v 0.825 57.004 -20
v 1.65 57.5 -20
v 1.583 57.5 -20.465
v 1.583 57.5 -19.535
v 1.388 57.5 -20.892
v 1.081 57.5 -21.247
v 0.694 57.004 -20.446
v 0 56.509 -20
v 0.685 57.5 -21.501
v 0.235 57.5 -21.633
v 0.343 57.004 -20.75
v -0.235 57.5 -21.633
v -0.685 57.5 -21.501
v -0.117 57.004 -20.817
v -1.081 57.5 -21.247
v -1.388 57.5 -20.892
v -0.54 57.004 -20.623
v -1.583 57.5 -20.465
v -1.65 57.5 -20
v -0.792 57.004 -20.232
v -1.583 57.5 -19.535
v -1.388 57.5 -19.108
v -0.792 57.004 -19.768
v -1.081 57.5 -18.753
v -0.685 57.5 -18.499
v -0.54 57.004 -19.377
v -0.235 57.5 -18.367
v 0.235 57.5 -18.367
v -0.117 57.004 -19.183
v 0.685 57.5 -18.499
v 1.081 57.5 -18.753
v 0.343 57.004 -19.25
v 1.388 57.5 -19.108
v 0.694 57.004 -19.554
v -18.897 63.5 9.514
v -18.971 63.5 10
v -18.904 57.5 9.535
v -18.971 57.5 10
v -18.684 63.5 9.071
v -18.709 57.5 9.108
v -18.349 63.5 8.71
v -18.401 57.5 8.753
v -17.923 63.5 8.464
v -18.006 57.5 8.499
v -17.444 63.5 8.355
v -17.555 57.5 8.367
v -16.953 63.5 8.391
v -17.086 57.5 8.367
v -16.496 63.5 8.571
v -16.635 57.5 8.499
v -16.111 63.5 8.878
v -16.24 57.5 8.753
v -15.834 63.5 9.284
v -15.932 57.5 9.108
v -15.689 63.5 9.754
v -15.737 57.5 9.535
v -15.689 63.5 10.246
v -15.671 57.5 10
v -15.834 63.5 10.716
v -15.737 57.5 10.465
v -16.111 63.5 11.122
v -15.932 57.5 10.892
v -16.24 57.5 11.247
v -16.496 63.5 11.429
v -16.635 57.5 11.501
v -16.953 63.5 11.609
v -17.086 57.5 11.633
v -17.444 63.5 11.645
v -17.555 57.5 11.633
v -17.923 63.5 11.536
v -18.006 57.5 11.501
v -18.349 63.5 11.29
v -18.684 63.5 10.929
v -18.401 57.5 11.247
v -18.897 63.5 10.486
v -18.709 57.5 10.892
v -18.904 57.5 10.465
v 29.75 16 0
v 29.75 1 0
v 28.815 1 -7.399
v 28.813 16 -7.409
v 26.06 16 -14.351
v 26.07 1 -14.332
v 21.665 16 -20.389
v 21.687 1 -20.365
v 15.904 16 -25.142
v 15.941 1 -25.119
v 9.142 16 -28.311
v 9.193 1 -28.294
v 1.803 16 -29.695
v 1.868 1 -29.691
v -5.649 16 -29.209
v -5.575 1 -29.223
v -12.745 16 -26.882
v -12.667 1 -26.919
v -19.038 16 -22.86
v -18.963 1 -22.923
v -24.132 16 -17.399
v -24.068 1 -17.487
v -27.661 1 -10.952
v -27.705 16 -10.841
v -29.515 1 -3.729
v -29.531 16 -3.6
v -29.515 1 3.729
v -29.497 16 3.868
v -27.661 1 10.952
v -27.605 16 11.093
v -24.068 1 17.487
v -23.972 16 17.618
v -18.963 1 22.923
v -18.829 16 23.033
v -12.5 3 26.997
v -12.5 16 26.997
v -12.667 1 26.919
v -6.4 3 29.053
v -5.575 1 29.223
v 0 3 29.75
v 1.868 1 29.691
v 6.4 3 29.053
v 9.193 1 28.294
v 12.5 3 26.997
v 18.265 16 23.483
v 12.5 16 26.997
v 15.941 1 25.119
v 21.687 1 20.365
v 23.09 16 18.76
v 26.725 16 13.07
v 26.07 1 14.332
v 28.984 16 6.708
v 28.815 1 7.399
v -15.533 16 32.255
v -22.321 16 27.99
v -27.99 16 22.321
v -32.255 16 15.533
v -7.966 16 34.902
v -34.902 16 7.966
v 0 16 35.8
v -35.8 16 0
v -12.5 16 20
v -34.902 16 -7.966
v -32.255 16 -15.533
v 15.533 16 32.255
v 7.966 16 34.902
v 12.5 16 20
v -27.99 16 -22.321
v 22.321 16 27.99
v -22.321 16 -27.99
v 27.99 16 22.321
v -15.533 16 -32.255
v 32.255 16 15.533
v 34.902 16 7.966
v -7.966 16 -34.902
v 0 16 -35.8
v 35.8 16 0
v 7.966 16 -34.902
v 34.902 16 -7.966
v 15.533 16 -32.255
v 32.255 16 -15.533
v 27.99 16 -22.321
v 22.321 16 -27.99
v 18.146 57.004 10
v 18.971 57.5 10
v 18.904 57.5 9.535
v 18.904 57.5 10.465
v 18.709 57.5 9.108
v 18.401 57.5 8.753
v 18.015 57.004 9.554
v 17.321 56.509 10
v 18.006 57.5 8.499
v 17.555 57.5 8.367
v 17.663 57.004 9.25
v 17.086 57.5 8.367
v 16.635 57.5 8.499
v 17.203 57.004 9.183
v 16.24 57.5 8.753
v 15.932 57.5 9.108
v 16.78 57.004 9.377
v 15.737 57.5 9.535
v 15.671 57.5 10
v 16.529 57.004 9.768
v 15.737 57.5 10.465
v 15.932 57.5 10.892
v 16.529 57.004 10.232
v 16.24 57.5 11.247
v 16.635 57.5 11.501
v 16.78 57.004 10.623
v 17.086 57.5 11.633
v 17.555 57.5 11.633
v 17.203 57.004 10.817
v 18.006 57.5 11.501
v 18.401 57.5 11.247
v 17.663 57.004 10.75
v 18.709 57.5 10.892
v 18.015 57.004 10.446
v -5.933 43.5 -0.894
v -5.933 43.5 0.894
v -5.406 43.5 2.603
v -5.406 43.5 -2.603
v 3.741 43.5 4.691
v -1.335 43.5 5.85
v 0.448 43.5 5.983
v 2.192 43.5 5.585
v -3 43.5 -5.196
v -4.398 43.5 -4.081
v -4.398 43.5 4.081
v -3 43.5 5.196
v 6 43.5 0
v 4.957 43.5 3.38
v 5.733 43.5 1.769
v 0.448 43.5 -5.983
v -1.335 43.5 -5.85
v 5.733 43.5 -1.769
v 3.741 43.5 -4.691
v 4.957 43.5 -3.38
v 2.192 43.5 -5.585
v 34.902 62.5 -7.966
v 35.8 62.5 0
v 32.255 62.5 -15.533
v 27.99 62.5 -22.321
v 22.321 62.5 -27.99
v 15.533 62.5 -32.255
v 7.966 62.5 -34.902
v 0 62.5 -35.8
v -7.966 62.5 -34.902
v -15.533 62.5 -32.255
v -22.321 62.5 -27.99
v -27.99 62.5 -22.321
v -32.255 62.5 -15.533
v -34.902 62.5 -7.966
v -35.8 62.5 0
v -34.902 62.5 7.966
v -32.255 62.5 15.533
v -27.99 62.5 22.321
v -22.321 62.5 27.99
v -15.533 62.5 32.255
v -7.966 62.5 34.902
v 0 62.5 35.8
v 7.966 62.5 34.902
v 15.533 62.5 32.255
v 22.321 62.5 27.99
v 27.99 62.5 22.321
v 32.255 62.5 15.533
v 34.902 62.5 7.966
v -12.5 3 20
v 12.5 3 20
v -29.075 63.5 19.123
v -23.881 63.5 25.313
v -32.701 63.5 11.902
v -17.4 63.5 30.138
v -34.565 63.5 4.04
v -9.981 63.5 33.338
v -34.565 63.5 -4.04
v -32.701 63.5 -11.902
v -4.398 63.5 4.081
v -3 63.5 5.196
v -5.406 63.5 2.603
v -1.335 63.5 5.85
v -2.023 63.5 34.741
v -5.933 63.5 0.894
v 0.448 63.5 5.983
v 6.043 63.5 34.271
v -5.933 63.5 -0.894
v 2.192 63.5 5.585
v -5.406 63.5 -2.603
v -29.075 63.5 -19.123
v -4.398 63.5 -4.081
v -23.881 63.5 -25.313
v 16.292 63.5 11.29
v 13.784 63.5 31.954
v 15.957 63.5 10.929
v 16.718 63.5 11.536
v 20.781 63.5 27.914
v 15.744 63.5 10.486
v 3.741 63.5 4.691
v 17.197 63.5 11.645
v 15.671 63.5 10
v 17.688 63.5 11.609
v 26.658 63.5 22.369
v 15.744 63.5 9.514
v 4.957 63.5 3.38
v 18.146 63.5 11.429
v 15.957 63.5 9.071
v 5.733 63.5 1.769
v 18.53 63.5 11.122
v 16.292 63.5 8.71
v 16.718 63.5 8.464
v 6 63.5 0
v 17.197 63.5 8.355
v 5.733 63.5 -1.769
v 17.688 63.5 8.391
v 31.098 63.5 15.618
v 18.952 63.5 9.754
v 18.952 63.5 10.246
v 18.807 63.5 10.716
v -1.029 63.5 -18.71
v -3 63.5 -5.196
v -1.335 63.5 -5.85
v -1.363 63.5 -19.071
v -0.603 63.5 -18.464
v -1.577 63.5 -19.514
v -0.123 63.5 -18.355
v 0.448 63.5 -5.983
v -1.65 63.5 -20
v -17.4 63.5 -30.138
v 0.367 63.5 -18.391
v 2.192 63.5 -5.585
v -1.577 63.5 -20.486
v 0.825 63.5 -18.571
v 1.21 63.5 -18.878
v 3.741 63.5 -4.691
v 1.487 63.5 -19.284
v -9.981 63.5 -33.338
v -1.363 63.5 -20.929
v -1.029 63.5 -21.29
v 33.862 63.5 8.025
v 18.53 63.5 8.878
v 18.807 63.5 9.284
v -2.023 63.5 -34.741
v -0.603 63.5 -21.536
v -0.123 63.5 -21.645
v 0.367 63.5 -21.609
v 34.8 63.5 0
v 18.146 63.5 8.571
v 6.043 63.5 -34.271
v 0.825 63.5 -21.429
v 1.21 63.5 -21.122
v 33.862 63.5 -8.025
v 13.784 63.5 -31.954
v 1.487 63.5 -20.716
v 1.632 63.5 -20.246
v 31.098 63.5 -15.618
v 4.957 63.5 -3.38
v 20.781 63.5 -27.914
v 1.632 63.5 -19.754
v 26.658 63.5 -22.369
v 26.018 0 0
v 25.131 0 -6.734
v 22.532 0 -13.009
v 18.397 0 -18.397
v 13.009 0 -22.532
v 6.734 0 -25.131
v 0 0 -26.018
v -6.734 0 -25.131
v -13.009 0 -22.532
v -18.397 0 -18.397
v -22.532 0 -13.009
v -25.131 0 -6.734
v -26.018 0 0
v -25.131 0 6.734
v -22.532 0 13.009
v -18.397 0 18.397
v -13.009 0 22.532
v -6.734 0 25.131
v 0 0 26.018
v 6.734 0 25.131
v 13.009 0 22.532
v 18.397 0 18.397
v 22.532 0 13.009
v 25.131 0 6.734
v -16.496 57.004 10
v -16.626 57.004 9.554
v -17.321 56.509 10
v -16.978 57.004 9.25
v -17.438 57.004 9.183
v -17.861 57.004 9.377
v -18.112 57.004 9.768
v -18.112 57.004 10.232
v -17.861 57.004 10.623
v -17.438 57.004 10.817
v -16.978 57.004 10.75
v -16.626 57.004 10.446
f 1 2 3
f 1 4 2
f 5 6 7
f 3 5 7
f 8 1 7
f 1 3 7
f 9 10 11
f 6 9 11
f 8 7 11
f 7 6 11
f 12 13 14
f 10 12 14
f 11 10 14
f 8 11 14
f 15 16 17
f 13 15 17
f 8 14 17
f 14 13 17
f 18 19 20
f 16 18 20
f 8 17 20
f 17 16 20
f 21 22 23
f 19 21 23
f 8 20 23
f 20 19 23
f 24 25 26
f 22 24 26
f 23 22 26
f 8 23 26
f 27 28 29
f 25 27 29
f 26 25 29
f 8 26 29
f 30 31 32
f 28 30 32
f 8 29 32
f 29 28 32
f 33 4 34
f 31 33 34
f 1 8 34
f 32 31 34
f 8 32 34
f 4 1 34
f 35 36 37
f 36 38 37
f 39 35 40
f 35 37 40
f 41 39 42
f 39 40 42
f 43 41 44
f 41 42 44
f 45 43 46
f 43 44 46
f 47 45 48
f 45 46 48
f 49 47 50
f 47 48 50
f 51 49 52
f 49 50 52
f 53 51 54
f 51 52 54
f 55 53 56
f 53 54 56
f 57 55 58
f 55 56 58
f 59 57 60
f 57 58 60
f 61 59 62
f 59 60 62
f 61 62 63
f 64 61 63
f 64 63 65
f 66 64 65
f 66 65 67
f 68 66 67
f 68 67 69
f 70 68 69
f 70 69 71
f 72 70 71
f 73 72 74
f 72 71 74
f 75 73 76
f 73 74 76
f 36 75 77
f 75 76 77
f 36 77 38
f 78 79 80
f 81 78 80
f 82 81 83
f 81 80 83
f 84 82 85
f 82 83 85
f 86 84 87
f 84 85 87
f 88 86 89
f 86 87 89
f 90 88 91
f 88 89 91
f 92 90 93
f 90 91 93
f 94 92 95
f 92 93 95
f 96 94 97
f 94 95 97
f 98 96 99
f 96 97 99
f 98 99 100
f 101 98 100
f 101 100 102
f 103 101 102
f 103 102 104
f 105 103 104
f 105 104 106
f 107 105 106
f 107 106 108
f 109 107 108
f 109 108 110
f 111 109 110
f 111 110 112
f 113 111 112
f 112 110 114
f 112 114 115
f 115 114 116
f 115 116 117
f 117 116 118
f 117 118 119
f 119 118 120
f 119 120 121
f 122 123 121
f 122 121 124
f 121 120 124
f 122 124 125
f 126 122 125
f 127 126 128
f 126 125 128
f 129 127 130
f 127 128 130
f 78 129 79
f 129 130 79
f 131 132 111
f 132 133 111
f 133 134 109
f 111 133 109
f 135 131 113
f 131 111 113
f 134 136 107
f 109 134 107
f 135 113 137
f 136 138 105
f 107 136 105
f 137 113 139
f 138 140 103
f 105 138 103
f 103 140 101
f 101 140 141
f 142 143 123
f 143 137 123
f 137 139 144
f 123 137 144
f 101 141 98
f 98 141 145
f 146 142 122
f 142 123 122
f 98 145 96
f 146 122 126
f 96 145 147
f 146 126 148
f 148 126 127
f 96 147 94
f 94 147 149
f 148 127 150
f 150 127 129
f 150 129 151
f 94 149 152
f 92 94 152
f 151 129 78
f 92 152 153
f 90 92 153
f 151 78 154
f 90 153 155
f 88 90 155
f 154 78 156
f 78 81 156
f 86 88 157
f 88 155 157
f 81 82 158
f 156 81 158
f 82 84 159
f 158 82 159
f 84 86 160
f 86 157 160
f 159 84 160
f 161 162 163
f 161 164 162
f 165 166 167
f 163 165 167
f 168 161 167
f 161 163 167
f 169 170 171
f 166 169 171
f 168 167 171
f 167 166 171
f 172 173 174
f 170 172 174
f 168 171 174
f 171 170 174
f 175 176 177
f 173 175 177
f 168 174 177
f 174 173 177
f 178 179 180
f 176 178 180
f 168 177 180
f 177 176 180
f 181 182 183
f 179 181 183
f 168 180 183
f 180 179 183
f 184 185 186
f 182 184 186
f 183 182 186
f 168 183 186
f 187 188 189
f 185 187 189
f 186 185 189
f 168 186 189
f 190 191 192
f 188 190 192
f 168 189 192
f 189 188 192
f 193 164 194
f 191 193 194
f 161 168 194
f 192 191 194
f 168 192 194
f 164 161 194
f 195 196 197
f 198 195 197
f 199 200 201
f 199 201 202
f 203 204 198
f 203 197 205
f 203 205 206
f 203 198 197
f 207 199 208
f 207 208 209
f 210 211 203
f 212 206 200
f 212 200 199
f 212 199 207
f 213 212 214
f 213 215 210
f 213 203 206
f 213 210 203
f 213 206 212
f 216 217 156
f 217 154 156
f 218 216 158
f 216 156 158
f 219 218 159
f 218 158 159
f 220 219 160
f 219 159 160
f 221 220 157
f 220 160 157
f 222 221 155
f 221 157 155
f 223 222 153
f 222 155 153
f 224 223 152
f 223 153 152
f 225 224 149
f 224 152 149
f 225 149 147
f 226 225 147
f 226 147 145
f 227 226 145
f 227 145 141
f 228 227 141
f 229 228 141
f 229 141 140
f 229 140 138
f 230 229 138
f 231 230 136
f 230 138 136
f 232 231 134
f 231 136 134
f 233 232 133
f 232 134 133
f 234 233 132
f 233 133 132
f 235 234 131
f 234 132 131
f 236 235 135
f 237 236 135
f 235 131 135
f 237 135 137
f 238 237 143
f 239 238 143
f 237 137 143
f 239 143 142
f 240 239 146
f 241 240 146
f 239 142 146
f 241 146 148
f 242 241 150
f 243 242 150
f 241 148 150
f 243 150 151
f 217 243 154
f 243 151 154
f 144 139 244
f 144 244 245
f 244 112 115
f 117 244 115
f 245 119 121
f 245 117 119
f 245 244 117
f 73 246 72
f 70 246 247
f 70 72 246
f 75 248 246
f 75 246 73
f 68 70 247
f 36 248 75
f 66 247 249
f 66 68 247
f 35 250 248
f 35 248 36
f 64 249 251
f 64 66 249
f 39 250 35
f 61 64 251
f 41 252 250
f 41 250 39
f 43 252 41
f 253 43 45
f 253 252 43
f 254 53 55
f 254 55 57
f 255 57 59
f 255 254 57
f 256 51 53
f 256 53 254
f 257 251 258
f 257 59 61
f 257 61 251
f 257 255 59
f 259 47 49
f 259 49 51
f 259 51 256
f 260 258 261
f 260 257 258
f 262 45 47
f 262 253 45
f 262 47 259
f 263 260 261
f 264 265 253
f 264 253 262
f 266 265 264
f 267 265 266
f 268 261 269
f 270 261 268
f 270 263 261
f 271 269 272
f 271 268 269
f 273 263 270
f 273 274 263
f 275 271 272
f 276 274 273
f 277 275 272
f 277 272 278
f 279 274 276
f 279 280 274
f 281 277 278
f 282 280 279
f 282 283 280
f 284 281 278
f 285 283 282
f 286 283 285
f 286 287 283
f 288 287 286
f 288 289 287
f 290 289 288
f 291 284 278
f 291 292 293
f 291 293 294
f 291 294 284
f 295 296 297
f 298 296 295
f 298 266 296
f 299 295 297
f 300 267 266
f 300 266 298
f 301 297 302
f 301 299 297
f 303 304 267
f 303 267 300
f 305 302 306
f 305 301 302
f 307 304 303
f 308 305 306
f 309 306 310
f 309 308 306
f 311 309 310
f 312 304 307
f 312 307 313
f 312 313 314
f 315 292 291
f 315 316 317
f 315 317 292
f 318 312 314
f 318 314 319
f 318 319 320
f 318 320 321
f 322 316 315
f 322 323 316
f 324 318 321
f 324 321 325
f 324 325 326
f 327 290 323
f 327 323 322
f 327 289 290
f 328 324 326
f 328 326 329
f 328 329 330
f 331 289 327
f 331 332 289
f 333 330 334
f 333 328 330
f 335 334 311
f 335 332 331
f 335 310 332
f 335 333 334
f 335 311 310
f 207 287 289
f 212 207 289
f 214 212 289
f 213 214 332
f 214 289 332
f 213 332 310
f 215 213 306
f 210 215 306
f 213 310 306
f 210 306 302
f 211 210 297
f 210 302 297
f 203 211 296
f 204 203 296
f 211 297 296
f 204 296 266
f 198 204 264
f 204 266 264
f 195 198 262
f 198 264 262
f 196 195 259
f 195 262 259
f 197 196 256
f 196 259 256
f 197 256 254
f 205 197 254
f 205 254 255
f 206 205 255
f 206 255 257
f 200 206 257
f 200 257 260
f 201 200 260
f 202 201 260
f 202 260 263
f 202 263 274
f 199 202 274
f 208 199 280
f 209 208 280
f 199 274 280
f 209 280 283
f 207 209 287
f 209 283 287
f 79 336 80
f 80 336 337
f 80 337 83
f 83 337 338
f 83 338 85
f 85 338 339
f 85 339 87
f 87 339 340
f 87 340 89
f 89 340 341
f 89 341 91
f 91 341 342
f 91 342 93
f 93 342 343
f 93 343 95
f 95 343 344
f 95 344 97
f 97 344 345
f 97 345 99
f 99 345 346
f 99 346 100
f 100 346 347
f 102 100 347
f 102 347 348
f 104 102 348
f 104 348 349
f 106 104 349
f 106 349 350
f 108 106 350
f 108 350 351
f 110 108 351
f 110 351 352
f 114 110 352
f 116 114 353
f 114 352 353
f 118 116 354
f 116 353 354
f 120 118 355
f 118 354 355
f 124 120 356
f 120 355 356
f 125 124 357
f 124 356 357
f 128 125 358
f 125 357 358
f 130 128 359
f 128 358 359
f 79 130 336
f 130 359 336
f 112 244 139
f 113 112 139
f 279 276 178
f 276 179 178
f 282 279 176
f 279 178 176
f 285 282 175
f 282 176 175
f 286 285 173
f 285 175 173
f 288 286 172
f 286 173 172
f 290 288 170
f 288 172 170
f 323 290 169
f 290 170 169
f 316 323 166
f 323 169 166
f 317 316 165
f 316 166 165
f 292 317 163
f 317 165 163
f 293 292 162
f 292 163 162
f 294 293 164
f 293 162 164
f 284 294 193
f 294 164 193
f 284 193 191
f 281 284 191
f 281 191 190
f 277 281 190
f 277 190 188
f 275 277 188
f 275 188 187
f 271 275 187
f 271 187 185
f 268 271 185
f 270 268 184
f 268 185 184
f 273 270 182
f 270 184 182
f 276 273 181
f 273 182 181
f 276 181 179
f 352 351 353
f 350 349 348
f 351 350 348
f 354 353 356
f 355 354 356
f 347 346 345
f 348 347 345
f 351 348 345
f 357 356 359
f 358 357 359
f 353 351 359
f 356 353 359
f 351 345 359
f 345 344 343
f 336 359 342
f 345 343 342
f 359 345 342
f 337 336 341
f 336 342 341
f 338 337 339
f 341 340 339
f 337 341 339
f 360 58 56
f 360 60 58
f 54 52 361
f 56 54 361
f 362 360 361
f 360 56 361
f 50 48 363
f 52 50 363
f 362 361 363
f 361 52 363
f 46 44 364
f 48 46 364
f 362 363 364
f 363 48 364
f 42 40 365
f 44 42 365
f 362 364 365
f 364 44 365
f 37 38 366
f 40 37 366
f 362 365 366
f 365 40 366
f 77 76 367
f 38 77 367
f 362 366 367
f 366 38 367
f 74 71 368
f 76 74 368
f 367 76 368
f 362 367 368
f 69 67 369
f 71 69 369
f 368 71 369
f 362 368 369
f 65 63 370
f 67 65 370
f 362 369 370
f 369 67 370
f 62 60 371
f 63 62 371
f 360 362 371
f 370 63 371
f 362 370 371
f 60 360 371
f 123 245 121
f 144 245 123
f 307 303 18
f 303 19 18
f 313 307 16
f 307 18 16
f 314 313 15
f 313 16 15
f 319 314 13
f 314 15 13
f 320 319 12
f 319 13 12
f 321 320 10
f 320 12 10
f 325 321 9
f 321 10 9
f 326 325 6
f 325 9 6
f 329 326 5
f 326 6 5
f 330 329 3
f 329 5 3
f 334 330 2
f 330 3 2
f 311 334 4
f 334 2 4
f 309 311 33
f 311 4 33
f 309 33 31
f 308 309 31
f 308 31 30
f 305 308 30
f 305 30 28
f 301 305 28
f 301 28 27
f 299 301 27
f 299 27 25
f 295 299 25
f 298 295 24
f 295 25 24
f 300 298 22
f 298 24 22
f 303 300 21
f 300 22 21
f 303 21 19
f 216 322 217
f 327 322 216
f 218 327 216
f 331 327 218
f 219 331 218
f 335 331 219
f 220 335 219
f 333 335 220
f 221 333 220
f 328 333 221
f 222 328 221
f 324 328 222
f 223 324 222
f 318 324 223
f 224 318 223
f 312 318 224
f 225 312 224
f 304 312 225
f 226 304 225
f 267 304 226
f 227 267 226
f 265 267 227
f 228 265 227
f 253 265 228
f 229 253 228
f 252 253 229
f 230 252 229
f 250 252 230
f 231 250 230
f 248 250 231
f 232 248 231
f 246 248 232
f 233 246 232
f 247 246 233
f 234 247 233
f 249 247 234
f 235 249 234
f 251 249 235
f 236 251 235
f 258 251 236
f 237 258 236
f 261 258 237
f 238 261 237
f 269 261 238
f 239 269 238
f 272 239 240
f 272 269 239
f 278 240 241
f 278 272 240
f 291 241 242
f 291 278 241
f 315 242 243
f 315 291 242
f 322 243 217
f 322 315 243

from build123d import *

# Parameters (mm, degrees)
SKETCH1_R             = 29.75
BOSS_EXTRUDE1_DEPTH   = 16
SKETCH2_R             = 35.8
BOSS_EXTRUDE2_DEPTH   = 47.5
M4_TAPPED_HOLE1_D     = 3.3
M4_TAPPED_HOLE1_DEPTH = 6
M4_TAPPED_HOLE1_TIP   = 0.991420021
SKETCH6_R             = 6
CUT_EXTRUDE1_DEPTH    = 20
CHAMFER1_SIZE         = 1
CHAMFER2_SIZE         = 1
CHAMFER2_SIZE2        = 3.732050808
CUT_EXTRUDE2_START    = 20
SKETCH7_W             = 25
SKETCH7_H             = 13
CUT_EXTRUDE2_DEPTH    = 20


with BuildPart() as part:
    # Sketch1 → Boss-Extrude1 (new body)
    with BuildSketch(Plane(origin=(0, 0, 0), x_dir=(1, 0, 0), z_dir=(0, 1, 0))):
        Circle(SKETCH1_R)
    extrude(amount=BOSS_EXTRUDE1_DEPTH)

    # Sketch2 → Boss-Extrude2 (add)
    with BuildSketch(Plane(origin=(0, 16, 0), x_dir=(1, 0, 0), z_dir=(0, 1, 0))):
        Circle(SKETCH2_R)
    extrude(amount=BOSS_EXTRUDE2_DEPTH)

    # M4 Tapped Hole1
    with Locations(Plane(origin=(0, 63.5, 0), x_dir=(1, 0, 0), z_dir=(0, 1, 0))):
        with Locations((0, 20), (17.320508076, -10), (-17.320508076, -10)):
            Hole(M4_TAPPED_HOLE1_D / 2, depth=M4_TAPPED_HOLE1_DEPTH)
            with Locations((0, 0, -(M4_TAPPED_HOLE1_DEPTH + M4_TAPPED_HOLE1_TIP / 2))):  # 118° drill point
                Cone(0, M4_TAPPED_HOLE1_D / 2, M4_TAPPED_HOLE1_TIP, mode=Mode.SUBTRACT)

    # Sketch6 → Cut-Extrude1 (cut)
    with BuildSketch(Plane(origin=(0, 63.5, 0), x_dir=(1, 0, 0), z_dir=(0, 1, 0))):
        Circle(SKETCH6_R)
    extrude(amount=-CUT_EXTRUDE1_DEPTH, mode=Mode.SUBTRACT)

    # Chamfer1
    chamfer1_edges = [part.edges().sort_by_distance(p)[0] for p in [
        (-35.8, 63.5, 0),
    ]]
    chamfer(chamfer1_edges, length=CHAMFER1_SIZE)

    # Chamfer2
    chamfer2_edges = [part.edges().sort_by_distance(p)[0] for p in [
        (-29.75, 0, 0),
    ]]
    chamfer2_side = [part.faces().sort_by_distance(p)[0] for p in [
        (-29.75, 8, 0),
    ]]
    chamfer(chamfer2_edges, length=CHAMFER2_SIZE, length2=CHAMFER2_SIZE2, reference=chamfer2_side[0])

    # Sketch7 → Cut-Extrude2 (cut)
    with BuildSketch(Plane.XY.offset(CUT_EXTRUDE2_START)):
        with Locations((0, 9.5)):
            Rectangle(SKETCH7_W, SKETCH7_H)
    extrude(amount=CUT_EXTRUDE2_DEPTH, mode=Mode.SUBTRACT)


solid = part.part
